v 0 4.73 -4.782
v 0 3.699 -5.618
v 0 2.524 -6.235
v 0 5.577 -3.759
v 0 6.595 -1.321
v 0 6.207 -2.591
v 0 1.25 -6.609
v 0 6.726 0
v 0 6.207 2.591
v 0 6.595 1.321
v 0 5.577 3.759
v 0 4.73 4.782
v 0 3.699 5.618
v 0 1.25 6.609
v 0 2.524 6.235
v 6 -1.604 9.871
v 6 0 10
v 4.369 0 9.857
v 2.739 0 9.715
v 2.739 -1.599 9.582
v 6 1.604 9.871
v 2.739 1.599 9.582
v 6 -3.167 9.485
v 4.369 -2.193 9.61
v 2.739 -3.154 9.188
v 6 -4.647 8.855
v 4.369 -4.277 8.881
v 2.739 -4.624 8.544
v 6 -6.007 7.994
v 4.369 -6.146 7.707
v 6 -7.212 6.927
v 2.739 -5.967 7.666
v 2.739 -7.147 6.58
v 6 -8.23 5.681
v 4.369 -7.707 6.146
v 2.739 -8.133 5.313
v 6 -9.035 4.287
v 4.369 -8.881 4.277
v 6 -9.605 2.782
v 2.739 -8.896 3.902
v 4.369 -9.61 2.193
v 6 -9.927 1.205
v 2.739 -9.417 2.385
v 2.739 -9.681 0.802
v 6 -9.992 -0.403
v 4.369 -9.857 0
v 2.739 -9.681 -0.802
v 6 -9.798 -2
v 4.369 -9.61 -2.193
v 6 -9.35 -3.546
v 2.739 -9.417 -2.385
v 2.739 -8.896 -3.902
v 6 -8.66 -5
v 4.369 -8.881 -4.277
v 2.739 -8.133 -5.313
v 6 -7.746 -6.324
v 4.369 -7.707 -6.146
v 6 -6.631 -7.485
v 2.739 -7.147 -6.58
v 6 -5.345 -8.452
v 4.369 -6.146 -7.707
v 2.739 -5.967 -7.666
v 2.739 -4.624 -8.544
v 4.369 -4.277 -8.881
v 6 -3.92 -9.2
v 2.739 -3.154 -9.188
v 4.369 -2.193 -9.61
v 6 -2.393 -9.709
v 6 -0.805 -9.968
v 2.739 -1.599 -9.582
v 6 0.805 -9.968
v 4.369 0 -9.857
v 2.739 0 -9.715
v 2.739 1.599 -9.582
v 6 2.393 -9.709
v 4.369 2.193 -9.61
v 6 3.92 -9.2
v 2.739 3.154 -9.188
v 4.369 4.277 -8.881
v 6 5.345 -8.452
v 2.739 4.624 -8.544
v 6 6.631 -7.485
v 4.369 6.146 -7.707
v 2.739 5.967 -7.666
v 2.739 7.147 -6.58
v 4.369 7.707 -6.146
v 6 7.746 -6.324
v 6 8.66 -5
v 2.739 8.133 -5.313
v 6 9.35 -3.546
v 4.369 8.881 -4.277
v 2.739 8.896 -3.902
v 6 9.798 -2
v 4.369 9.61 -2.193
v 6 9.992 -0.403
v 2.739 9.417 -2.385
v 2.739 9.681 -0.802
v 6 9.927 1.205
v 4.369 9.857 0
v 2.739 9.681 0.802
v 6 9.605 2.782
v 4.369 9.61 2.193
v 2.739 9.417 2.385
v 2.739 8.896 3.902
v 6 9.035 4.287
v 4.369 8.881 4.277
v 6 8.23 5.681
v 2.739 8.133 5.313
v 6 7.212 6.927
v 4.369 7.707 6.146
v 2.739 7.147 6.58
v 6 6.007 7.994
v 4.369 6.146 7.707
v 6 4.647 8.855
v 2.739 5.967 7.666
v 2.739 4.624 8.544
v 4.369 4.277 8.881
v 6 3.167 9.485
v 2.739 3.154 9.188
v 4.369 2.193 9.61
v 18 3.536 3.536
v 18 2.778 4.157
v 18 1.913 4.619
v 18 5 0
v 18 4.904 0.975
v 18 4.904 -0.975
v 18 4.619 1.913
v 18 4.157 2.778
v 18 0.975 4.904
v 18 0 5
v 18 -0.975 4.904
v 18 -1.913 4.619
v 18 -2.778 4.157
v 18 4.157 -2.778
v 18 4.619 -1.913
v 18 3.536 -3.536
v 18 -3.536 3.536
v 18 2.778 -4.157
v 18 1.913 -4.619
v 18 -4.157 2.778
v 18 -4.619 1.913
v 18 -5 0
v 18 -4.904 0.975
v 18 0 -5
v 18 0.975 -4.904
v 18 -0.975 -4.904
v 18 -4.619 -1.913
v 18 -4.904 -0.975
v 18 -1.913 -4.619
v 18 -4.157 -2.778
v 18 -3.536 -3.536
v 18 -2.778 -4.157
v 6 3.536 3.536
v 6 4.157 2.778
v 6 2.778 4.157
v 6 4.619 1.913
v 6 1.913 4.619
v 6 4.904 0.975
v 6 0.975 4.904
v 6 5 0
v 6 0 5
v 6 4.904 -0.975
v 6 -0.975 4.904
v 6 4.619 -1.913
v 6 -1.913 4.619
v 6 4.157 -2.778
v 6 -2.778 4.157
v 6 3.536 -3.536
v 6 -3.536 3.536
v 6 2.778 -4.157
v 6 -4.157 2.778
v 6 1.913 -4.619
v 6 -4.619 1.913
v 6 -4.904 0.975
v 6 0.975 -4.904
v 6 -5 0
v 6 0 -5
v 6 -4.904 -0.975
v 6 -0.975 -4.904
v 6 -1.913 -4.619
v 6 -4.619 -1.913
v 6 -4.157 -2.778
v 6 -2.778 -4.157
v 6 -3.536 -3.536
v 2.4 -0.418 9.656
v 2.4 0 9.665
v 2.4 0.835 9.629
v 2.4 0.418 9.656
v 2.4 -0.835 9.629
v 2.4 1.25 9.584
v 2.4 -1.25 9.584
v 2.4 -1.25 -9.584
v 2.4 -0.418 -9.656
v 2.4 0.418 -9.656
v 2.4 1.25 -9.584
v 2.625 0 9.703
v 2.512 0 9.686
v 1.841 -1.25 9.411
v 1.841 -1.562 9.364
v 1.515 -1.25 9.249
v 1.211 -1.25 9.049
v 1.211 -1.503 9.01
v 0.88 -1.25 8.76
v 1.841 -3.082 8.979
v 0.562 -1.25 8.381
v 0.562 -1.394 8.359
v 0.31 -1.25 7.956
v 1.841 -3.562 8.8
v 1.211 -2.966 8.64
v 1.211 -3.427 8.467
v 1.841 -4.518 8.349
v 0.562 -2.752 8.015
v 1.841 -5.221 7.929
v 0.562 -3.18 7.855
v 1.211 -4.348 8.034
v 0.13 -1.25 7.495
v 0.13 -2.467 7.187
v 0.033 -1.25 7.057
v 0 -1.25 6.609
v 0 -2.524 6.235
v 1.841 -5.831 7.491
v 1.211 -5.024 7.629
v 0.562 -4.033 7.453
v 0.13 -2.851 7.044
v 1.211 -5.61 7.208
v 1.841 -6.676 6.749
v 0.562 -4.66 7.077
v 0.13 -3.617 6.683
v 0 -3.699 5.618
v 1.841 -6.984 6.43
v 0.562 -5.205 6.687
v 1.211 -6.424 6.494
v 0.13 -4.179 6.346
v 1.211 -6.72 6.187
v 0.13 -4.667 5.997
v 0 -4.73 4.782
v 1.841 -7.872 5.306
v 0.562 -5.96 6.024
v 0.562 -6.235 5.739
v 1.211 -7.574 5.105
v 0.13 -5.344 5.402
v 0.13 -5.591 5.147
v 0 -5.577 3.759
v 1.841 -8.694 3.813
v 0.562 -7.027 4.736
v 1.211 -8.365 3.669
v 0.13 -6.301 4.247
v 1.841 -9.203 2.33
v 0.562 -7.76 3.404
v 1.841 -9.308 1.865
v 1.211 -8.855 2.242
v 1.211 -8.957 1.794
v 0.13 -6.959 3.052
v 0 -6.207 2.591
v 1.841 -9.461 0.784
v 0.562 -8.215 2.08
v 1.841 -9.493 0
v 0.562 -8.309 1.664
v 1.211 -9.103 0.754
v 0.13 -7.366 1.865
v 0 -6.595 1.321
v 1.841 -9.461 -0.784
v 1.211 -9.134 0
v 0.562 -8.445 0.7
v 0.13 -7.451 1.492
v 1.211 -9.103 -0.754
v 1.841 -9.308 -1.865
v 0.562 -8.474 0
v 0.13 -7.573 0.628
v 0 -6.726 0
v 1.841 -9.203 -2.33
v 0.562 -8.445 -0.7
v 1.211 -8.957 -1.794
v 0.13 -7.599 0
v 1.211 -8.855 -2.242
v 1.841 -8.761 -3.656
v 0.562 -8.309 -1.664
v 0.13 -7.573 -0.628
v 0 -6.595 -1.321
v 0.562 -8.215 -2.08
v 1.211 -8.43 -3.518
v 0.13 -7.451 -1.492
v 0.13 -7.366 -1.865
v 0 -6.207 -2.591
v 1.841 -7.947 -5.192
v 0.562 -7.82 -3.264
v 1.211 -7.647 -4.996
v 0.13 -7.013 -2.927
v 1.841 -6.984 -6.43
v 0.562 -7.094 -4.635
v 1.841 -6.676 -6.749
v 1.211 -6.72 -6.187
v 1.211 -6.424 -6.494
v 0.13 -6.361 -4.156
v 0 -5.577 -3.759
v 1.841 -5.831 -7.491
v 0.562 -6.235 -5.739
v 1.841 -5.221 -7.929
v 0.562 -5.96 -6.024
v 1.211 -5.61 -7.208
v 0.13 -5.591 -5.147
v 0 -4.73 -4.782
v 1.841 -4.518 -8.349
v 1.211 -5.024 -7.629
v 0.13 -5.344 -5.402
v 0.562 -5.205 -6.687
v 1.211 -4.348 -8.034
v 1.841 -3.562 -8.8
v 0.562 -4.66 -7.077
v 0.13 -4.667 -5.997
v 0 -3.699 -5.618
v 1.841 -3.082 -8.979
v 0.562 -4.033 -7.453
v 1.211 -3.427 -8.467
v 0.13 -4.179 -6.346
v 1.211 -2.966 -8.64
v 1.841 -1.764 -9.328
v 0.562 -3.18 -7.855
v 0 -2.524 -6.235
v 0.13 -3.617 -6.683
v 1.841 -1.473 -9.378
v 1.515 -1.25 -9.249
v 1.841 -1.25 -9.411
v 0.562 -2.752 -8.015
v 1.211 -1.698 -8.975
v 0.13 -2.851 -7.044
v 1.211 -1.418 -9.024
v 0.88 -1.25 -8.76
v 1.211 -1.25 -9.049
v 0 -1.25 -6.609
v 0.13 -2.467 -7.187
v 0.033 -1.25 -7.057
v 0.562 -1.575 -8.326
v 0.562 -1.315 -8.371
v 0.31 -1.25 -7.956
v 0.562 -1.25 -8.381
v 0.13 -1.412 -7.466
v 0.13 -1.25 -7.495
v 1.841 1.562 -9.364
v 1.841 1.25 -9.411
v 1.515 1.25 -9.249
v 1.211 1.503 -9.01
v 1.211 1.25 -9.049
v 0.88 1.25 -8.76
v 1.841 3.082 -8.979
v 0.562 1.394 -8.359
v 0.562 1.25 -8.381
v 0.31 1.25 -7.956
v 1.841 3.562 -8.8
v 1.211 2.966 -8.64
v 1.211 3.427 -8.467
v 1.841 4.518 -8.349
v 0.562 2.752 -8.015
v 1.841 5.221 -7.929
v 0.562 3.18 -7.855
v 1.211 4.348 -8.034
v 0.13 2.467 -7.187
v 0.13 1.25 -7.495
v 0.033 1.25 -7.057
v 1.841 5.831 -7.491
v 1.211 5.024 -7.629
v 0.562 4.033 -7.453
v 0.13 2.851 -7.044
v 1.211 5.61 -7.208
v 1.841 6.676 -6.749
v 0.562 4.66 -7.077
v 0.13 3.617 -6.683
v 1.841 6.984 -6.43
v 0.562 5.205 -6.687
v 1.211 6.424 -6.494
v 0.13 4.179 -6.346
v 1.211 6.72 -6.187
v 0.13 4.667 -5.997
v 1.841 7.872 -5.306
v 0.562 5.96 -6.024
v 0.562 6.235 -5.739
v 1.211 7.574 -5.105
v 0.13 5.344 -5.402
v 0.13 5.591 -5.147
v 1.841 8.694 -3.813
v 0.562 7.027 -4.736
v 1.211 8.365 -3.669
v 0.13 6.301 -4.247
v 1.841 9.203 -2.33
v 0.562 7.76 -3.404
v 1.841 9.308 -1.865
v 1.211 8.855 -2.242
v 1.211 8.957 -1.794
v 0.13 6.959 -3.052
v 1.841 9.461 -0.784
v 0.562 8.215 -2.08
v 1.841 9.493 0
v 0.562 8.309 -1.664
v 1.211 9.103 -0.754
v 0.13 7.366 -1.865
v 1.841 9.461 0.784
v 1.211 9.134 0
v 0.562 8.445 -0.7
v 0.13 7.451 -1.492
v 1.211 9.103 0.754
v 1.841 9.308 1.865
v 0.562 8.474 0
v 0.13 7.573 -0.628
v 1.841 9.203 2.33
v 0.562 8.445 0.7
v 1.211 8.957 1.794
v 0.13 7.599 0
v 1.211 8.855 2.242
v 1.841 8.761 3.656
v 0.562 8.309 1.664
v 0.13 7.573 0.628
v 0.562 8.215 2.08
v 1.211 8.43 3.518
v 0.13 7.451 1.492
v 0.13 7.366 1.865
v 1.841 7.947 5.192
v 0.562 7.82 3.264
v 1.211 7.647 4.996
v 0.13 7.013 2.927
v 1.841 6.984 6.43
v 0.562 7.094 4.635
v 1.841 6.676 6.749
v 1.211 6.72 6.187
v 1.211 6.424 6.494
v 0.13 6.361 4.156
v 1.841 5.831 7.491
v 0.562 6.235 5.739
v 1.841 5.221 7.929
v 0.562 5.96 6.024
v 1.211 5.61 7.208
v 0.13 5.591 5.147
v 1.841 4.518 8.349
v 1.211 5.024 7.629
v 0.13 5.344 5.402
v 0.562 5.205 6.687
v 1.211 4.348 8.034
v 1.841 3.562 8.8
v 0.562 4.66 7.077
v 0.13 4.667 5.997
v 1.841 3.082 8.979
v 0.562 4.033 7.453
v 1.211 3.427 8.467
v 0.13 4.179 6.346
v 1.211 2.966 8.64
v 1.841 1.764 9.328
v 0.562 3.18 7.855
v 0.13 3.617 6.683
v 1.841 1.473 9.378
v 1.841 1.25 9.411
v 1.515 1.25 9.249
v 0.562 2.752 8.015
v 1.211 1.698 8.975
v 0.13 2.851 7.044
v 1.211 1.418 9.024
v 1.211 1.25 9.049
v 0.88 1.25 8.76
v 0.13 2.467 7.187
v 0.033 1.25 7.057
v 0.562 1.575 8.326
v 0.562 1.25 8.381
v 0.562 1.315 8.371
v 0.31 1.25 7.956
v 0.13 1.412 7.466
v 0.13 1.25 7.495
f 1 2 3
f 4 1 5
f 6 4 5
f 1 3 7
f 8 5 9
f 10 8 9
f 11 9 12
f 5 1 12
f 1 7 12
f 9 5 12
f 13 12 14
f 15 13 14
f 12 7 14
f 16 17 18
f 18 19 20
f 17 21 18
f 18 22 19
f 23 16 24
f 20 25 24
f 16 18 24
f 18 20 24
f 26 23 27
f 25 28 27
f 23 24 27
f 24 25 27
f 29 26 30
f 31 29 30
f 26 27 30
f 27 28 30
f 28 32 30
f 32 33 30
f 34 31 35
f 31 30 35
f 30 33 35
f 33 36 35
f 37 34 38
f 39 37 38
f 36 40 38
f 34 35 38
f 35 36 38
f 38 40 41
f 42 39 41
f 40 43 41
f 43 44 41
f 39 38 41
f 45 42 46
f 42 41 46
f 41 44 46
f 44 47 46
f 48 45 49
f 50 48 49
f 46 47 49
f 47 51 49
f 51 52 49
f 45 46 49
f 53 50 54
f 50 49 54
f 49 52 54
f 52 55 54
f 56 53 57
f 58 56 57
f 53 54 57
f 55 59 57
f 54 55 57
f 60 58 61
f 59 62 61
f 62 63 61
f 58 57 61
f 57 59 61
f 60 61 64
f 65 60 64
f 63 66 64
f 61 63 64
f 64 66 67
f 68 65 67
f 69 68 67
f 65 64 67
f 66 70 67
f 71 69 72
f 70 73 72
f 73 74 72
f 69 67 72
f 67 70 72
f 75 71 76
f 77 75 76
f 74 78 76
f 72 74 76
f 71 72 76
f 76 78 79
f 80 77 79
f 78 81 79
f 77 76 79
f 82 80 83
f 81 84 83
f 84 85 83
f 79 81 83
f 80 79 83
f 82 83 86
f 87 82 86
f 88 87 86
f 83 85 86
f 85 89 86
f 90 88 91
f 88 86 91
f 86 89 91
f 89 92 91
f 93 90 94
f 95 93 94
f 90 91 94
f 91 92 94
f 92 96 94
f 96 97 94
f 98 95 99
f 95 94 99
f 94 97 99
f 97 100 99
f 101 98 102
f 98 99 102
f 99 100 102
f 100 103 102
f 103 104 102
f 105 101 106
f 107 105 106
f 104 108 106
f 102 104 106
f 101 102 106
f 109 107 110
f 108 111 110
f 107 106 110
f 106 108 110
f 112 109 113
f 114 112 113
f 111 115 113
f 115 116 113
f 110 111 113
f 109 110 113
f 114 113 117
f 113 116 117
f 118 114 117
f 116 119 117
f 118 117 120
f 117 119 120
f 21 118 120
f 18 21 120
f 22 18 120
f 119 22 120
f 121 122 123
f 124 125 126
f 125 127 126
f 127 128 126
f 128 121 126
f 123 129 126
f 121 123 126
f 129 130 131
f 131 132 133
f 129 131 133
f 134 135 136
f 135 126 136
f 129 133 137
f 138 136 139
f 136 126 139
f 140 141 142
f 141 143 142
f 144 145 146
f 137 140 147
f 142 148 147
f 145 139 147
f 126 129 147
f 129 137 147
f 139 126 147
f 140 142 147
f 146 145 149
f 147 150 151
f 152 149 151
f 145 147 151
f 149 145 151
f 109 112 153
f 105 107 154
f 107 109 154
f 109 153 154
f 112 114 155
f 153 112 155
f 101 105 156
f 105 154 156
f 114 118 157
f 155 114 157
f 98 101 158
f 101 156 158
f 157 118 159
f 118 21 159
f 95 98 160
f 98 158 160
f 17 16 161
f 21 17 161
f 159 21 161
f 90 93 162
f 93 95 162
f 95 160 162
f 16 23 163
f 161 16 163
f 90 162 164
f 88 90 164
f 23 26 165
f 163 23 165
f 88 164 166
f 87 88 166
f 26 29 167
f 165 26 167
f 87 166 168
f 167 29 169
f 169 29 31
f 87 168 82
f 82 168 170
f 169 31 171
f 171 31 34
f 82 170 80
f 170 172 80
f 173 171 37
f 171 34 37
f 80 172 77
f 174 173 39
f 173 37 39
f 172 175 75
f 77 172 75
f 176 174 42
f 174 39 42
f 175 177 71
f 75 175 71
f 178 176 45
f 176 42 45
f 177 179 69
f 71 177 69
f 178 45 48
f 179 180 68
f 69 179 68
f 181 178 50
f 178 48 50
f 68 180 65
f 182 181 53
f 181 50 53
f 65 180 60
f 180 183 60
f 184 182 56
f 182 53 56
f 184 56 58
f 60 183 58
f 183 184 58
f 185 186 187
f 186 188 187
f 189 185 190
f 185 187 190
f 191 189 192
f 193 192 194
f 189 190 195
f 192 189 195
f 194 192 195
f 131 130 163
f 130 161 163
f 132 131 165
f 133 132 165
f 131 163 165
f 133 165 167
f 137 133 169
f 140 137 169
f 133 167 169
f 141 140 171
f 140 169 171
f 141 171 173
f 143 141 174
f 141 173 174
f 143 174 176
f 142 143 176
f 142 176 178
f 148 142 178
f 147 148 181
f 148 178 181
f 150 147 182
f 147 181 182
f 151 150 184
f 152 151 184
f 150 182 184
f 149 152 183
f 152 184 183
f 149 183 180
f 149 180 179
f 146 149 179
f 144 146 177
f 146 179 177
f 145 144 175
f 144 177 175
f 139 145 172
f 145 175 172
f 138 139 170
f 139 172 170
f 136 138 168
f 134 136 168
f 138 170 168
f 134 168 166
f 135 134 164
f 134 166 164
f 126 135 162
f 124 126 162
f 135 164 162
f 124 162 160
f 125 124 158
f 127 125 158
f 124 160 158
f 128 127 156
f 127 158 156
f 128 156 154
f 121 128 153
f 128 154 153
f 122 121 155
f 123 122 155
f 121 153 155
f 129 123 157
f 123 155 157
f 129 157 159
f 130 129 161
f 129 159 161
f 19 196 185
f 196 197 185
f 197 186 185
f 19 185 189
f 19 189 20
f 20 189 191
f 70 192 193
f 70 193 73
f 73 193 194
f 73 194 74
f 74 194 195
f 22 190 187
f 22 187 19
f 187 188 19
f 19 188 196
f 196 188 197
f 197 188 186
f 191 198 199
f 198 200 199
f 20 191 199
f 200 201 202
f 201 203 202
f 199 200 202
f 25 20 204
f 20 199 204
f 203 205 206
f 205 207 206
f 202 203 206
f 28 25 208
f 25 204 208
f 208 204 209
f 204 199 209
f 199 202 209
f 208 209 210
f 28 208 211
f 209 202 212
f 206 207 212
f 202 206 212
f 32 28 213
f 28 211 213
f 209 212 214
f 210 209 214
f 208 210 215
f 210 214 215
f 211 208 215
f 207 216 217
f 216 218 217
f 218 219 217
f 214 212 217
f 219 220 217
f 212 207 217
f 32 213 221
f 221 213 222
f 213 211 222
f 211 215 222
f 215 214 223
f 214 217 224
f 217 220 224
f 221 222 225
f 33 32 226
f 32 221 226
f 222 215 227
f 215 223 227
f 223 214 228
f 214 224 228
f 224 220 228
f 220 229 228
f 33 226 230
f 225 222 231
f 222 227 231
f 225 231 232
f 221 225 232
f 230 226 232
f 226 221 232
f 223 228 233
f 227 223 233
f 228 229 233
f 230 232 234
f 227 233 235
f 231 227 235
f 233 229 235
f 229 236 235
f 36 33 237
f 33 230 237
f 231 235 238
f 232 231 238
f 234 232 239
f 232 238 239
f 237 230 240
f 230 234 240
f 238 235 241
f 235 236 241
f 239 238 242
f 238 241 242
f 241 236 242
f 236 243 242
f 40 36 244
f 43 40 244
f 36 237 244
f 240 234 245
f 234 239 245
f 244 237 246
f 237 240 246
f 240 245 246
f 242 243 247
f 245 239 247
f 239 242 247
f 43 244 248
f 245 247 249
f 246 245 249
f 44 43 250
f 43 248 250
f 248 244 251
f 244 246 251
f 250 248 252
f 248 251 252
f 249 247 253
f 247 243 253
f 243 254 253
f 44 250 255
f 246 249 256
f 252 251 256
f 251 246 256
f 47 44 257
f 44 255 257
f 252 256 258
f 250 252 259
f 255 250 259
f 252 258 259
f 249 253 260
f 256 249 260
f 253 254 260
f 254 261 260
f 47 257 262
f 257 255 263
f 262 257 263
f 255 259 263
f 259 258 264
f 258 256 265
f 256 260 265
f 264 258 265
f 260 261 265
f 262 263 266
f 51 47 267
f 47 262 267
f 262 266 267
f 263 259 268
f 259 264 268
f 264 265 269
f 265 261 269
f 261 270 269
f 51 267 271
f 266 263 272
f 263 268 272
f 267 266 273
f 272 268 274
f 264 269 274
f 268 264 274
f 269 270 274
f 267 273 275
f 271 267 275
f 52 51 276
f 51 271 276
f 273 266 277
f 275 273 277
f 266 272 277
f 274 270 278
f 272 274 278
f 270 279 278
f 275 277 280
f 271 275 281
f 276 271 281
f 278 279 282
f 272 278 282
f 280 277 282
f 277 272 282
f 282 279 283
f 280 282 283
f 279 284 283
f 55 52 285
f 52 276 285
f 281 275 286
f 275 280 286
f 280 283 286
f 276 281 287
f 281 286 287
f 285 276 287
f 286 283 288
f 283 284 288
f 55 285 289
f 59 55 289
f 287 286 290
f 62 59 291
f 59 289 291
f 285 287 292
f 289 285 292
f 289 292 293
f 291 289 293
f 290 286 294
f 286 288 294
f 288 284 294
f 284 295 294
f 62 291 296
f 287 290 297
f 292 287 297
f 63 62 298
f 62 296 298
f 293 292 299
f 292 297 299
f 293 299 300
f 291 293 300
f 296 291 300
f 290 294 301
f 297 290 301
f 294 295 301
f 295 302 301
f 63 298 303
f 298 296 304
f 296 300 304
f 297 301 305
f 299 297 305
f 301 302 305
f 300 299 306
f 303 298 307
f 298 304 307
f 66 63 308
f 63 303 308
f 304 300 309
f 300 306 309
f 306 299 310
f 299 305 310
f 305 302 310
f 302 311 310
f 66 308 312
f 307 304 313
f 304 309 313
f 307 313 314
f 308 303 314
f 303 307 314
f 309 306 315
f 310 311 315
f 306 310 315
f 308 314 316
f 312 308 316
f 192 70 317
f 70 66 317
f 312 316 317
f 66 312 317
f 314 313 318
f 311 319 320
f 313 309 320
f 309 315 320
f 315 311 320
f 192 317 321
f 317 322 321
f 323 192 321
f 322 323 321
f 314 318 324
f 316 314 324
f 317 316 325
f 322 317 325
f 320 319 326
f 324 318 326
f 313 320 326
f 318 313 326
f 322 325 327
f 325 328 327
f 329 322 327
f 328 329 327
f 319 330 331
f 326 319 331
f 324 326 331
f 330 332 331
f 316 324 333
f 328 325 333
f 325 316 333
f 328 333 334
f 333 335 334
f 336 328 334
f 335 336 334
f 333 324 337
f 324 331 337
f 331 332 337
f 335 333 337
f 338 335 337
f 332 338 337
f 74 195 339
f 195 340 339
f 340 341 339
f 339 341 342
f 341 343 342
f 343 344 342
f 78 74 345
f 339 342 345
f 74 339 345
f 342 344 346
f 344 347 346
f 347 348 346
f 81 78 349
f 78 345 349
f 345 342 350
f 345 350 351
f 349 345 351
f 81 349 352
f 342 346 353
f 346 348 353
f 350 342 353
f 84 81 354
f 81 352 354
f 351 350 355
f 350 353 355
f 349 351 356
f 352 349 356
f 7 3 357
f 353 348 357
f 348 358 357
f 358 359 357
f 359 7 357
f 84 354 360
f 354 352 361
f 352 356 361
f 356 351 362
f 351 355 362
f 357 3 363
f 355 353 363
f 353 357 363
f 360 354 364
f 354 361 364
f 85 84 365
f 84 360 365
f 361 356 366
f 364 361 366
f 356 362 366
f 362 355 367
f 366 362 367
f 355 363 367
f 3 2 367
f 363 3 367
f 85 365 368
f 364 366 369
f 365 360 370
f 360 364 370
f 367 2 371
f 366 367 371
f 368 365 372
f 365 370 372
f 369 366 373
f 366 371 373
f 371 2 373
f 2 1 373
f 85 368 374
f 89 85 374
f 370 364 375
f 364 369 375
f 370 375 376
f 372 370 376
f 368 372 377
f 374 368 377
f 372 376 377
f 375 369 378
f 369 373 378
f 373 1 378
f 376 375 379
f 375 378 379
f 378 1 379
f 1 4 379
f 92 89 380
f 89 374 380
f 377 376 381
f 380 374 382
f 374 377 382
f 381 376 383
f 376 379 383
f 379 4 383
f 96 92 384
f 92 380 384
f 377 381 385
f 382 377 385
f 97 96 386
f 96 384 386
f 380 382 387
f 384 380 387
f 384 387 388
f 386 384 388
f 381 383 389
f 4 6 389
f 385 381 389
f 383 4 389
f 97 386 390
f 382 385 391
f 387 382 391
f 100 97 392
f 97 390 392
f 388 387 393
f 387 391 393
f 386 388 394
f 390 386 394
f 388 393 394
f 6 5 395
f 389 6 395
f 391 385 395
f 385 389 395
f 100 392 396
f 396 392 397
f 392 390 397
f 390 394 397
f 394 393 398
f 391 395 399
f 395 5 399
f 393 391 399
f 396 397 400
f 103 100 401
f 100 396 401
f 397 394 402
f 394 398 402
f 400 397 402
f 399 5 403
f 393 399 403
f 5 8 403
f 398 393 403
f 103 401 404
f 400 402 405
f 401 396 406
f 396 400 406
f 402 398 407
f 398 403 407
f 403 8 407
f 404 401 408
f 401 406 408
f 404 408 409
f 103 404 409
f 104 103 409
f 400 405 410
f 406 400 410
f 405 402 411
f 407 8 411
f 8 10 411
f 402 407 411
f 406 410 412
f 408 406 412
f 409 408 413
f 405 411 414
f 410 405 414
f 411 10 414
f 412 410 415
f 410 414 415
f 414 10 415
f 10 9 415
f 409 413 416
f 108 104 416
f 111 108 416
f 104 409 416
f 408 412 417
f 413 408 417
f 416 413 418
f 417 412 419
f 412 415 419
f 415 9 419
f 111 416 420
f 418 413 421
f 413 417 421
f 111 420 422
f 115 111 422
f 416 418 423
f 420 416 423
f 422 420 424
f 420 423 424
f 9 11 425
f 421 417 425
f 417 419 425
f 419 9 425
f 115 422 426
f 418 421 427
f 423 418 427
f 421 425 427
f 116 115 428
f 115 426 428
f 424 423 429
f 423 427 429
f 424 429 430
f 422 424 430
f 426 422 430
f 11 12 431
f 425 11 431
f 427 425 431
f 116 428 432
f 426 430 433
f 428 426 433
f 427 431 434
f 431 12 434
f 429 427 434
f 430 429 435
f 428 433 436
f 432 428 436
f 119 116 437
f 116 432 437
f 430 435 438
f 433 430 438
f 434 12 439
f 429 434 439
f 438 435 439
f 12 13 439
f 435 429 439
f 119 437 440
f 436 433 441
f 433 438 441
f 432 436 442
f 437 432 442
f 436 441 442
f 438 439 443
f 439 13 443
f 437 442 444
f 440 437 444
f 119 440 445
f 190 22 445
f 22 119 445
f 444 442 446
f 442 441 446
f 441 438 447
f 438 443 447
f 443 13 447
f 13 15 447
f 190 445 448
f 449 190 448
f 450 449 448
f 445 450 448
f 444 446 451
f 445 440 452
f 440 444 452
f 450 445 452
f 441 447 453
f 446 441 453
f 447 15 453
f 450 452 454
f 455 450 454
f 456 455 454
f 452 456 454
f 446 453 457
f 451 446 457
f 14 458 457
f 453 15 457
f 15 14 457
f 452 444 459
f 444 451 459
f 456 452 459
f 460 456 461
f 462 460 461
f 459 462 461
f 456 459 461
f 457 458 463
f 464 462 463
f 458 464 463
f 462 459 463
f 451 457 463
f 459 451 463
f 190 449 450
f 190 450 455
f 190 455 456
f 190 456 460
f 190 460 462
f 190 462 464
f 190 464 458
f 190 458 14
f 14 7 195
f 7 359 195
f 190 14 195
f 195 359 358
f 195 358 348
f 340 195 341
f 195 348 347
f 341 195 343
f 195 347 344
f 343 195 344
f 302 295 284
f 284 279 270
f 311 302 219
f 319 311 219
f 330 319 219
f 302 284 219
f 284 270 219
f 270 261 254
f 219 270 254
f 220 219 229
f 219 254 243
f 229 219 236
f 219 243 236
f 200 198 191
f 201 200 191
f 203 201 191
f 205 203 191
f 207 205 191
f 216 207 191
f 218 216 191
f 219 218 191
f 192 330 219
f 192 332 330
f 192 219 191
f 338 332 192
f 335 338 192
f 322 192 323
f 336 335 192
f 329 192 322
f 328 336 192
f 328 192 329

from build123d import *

# Parameters (mm, degrees)
FILLET2_R  = 3
SKETCH2_W  = 20
SKETCH2_H  = 2.5
SLOT_DEPTH = 2.4


with BuildPart() as part:
    # BodySke → Base-Revolve (revolve)
    with BuildSketch(Plane.XY, mode=Mode.PRIVATE) as base_revolve_sk:
        Polygon((6, 5), (6, 10), (0, 9.475068019), (0, 0), (18, 0), (18, 5), align=None)
    revolve(base_revolve_sk.sketch.rotate(Axis((-25.4, 0, 0), (1, 0, 0)), 90), axis=Axis((-25.4, 0, 0), (1, 0, 0)))  # turned: the seam where the file's is

    # Fillet2
    fillet2_edges = [part.edges().sort_by_distance(p)[0] for p in [
        (0, 0, -9.475068019),
    ]]
    fillet(fillet2_edges, radius=FILLET2_R)

    # Sketch2 → Slot (cut)
    with BuildSketch(Plane(origin=(0, 0, 0), x_dir=(0, 0, -1), z_dir=(1, 0, 0))):
        Rectangle(SKETCH2_W, SKETCH2_H)
    extrude(amount=SLOT_DEPTH, mode=Mode.SUBTRACT)


solid = part.part
